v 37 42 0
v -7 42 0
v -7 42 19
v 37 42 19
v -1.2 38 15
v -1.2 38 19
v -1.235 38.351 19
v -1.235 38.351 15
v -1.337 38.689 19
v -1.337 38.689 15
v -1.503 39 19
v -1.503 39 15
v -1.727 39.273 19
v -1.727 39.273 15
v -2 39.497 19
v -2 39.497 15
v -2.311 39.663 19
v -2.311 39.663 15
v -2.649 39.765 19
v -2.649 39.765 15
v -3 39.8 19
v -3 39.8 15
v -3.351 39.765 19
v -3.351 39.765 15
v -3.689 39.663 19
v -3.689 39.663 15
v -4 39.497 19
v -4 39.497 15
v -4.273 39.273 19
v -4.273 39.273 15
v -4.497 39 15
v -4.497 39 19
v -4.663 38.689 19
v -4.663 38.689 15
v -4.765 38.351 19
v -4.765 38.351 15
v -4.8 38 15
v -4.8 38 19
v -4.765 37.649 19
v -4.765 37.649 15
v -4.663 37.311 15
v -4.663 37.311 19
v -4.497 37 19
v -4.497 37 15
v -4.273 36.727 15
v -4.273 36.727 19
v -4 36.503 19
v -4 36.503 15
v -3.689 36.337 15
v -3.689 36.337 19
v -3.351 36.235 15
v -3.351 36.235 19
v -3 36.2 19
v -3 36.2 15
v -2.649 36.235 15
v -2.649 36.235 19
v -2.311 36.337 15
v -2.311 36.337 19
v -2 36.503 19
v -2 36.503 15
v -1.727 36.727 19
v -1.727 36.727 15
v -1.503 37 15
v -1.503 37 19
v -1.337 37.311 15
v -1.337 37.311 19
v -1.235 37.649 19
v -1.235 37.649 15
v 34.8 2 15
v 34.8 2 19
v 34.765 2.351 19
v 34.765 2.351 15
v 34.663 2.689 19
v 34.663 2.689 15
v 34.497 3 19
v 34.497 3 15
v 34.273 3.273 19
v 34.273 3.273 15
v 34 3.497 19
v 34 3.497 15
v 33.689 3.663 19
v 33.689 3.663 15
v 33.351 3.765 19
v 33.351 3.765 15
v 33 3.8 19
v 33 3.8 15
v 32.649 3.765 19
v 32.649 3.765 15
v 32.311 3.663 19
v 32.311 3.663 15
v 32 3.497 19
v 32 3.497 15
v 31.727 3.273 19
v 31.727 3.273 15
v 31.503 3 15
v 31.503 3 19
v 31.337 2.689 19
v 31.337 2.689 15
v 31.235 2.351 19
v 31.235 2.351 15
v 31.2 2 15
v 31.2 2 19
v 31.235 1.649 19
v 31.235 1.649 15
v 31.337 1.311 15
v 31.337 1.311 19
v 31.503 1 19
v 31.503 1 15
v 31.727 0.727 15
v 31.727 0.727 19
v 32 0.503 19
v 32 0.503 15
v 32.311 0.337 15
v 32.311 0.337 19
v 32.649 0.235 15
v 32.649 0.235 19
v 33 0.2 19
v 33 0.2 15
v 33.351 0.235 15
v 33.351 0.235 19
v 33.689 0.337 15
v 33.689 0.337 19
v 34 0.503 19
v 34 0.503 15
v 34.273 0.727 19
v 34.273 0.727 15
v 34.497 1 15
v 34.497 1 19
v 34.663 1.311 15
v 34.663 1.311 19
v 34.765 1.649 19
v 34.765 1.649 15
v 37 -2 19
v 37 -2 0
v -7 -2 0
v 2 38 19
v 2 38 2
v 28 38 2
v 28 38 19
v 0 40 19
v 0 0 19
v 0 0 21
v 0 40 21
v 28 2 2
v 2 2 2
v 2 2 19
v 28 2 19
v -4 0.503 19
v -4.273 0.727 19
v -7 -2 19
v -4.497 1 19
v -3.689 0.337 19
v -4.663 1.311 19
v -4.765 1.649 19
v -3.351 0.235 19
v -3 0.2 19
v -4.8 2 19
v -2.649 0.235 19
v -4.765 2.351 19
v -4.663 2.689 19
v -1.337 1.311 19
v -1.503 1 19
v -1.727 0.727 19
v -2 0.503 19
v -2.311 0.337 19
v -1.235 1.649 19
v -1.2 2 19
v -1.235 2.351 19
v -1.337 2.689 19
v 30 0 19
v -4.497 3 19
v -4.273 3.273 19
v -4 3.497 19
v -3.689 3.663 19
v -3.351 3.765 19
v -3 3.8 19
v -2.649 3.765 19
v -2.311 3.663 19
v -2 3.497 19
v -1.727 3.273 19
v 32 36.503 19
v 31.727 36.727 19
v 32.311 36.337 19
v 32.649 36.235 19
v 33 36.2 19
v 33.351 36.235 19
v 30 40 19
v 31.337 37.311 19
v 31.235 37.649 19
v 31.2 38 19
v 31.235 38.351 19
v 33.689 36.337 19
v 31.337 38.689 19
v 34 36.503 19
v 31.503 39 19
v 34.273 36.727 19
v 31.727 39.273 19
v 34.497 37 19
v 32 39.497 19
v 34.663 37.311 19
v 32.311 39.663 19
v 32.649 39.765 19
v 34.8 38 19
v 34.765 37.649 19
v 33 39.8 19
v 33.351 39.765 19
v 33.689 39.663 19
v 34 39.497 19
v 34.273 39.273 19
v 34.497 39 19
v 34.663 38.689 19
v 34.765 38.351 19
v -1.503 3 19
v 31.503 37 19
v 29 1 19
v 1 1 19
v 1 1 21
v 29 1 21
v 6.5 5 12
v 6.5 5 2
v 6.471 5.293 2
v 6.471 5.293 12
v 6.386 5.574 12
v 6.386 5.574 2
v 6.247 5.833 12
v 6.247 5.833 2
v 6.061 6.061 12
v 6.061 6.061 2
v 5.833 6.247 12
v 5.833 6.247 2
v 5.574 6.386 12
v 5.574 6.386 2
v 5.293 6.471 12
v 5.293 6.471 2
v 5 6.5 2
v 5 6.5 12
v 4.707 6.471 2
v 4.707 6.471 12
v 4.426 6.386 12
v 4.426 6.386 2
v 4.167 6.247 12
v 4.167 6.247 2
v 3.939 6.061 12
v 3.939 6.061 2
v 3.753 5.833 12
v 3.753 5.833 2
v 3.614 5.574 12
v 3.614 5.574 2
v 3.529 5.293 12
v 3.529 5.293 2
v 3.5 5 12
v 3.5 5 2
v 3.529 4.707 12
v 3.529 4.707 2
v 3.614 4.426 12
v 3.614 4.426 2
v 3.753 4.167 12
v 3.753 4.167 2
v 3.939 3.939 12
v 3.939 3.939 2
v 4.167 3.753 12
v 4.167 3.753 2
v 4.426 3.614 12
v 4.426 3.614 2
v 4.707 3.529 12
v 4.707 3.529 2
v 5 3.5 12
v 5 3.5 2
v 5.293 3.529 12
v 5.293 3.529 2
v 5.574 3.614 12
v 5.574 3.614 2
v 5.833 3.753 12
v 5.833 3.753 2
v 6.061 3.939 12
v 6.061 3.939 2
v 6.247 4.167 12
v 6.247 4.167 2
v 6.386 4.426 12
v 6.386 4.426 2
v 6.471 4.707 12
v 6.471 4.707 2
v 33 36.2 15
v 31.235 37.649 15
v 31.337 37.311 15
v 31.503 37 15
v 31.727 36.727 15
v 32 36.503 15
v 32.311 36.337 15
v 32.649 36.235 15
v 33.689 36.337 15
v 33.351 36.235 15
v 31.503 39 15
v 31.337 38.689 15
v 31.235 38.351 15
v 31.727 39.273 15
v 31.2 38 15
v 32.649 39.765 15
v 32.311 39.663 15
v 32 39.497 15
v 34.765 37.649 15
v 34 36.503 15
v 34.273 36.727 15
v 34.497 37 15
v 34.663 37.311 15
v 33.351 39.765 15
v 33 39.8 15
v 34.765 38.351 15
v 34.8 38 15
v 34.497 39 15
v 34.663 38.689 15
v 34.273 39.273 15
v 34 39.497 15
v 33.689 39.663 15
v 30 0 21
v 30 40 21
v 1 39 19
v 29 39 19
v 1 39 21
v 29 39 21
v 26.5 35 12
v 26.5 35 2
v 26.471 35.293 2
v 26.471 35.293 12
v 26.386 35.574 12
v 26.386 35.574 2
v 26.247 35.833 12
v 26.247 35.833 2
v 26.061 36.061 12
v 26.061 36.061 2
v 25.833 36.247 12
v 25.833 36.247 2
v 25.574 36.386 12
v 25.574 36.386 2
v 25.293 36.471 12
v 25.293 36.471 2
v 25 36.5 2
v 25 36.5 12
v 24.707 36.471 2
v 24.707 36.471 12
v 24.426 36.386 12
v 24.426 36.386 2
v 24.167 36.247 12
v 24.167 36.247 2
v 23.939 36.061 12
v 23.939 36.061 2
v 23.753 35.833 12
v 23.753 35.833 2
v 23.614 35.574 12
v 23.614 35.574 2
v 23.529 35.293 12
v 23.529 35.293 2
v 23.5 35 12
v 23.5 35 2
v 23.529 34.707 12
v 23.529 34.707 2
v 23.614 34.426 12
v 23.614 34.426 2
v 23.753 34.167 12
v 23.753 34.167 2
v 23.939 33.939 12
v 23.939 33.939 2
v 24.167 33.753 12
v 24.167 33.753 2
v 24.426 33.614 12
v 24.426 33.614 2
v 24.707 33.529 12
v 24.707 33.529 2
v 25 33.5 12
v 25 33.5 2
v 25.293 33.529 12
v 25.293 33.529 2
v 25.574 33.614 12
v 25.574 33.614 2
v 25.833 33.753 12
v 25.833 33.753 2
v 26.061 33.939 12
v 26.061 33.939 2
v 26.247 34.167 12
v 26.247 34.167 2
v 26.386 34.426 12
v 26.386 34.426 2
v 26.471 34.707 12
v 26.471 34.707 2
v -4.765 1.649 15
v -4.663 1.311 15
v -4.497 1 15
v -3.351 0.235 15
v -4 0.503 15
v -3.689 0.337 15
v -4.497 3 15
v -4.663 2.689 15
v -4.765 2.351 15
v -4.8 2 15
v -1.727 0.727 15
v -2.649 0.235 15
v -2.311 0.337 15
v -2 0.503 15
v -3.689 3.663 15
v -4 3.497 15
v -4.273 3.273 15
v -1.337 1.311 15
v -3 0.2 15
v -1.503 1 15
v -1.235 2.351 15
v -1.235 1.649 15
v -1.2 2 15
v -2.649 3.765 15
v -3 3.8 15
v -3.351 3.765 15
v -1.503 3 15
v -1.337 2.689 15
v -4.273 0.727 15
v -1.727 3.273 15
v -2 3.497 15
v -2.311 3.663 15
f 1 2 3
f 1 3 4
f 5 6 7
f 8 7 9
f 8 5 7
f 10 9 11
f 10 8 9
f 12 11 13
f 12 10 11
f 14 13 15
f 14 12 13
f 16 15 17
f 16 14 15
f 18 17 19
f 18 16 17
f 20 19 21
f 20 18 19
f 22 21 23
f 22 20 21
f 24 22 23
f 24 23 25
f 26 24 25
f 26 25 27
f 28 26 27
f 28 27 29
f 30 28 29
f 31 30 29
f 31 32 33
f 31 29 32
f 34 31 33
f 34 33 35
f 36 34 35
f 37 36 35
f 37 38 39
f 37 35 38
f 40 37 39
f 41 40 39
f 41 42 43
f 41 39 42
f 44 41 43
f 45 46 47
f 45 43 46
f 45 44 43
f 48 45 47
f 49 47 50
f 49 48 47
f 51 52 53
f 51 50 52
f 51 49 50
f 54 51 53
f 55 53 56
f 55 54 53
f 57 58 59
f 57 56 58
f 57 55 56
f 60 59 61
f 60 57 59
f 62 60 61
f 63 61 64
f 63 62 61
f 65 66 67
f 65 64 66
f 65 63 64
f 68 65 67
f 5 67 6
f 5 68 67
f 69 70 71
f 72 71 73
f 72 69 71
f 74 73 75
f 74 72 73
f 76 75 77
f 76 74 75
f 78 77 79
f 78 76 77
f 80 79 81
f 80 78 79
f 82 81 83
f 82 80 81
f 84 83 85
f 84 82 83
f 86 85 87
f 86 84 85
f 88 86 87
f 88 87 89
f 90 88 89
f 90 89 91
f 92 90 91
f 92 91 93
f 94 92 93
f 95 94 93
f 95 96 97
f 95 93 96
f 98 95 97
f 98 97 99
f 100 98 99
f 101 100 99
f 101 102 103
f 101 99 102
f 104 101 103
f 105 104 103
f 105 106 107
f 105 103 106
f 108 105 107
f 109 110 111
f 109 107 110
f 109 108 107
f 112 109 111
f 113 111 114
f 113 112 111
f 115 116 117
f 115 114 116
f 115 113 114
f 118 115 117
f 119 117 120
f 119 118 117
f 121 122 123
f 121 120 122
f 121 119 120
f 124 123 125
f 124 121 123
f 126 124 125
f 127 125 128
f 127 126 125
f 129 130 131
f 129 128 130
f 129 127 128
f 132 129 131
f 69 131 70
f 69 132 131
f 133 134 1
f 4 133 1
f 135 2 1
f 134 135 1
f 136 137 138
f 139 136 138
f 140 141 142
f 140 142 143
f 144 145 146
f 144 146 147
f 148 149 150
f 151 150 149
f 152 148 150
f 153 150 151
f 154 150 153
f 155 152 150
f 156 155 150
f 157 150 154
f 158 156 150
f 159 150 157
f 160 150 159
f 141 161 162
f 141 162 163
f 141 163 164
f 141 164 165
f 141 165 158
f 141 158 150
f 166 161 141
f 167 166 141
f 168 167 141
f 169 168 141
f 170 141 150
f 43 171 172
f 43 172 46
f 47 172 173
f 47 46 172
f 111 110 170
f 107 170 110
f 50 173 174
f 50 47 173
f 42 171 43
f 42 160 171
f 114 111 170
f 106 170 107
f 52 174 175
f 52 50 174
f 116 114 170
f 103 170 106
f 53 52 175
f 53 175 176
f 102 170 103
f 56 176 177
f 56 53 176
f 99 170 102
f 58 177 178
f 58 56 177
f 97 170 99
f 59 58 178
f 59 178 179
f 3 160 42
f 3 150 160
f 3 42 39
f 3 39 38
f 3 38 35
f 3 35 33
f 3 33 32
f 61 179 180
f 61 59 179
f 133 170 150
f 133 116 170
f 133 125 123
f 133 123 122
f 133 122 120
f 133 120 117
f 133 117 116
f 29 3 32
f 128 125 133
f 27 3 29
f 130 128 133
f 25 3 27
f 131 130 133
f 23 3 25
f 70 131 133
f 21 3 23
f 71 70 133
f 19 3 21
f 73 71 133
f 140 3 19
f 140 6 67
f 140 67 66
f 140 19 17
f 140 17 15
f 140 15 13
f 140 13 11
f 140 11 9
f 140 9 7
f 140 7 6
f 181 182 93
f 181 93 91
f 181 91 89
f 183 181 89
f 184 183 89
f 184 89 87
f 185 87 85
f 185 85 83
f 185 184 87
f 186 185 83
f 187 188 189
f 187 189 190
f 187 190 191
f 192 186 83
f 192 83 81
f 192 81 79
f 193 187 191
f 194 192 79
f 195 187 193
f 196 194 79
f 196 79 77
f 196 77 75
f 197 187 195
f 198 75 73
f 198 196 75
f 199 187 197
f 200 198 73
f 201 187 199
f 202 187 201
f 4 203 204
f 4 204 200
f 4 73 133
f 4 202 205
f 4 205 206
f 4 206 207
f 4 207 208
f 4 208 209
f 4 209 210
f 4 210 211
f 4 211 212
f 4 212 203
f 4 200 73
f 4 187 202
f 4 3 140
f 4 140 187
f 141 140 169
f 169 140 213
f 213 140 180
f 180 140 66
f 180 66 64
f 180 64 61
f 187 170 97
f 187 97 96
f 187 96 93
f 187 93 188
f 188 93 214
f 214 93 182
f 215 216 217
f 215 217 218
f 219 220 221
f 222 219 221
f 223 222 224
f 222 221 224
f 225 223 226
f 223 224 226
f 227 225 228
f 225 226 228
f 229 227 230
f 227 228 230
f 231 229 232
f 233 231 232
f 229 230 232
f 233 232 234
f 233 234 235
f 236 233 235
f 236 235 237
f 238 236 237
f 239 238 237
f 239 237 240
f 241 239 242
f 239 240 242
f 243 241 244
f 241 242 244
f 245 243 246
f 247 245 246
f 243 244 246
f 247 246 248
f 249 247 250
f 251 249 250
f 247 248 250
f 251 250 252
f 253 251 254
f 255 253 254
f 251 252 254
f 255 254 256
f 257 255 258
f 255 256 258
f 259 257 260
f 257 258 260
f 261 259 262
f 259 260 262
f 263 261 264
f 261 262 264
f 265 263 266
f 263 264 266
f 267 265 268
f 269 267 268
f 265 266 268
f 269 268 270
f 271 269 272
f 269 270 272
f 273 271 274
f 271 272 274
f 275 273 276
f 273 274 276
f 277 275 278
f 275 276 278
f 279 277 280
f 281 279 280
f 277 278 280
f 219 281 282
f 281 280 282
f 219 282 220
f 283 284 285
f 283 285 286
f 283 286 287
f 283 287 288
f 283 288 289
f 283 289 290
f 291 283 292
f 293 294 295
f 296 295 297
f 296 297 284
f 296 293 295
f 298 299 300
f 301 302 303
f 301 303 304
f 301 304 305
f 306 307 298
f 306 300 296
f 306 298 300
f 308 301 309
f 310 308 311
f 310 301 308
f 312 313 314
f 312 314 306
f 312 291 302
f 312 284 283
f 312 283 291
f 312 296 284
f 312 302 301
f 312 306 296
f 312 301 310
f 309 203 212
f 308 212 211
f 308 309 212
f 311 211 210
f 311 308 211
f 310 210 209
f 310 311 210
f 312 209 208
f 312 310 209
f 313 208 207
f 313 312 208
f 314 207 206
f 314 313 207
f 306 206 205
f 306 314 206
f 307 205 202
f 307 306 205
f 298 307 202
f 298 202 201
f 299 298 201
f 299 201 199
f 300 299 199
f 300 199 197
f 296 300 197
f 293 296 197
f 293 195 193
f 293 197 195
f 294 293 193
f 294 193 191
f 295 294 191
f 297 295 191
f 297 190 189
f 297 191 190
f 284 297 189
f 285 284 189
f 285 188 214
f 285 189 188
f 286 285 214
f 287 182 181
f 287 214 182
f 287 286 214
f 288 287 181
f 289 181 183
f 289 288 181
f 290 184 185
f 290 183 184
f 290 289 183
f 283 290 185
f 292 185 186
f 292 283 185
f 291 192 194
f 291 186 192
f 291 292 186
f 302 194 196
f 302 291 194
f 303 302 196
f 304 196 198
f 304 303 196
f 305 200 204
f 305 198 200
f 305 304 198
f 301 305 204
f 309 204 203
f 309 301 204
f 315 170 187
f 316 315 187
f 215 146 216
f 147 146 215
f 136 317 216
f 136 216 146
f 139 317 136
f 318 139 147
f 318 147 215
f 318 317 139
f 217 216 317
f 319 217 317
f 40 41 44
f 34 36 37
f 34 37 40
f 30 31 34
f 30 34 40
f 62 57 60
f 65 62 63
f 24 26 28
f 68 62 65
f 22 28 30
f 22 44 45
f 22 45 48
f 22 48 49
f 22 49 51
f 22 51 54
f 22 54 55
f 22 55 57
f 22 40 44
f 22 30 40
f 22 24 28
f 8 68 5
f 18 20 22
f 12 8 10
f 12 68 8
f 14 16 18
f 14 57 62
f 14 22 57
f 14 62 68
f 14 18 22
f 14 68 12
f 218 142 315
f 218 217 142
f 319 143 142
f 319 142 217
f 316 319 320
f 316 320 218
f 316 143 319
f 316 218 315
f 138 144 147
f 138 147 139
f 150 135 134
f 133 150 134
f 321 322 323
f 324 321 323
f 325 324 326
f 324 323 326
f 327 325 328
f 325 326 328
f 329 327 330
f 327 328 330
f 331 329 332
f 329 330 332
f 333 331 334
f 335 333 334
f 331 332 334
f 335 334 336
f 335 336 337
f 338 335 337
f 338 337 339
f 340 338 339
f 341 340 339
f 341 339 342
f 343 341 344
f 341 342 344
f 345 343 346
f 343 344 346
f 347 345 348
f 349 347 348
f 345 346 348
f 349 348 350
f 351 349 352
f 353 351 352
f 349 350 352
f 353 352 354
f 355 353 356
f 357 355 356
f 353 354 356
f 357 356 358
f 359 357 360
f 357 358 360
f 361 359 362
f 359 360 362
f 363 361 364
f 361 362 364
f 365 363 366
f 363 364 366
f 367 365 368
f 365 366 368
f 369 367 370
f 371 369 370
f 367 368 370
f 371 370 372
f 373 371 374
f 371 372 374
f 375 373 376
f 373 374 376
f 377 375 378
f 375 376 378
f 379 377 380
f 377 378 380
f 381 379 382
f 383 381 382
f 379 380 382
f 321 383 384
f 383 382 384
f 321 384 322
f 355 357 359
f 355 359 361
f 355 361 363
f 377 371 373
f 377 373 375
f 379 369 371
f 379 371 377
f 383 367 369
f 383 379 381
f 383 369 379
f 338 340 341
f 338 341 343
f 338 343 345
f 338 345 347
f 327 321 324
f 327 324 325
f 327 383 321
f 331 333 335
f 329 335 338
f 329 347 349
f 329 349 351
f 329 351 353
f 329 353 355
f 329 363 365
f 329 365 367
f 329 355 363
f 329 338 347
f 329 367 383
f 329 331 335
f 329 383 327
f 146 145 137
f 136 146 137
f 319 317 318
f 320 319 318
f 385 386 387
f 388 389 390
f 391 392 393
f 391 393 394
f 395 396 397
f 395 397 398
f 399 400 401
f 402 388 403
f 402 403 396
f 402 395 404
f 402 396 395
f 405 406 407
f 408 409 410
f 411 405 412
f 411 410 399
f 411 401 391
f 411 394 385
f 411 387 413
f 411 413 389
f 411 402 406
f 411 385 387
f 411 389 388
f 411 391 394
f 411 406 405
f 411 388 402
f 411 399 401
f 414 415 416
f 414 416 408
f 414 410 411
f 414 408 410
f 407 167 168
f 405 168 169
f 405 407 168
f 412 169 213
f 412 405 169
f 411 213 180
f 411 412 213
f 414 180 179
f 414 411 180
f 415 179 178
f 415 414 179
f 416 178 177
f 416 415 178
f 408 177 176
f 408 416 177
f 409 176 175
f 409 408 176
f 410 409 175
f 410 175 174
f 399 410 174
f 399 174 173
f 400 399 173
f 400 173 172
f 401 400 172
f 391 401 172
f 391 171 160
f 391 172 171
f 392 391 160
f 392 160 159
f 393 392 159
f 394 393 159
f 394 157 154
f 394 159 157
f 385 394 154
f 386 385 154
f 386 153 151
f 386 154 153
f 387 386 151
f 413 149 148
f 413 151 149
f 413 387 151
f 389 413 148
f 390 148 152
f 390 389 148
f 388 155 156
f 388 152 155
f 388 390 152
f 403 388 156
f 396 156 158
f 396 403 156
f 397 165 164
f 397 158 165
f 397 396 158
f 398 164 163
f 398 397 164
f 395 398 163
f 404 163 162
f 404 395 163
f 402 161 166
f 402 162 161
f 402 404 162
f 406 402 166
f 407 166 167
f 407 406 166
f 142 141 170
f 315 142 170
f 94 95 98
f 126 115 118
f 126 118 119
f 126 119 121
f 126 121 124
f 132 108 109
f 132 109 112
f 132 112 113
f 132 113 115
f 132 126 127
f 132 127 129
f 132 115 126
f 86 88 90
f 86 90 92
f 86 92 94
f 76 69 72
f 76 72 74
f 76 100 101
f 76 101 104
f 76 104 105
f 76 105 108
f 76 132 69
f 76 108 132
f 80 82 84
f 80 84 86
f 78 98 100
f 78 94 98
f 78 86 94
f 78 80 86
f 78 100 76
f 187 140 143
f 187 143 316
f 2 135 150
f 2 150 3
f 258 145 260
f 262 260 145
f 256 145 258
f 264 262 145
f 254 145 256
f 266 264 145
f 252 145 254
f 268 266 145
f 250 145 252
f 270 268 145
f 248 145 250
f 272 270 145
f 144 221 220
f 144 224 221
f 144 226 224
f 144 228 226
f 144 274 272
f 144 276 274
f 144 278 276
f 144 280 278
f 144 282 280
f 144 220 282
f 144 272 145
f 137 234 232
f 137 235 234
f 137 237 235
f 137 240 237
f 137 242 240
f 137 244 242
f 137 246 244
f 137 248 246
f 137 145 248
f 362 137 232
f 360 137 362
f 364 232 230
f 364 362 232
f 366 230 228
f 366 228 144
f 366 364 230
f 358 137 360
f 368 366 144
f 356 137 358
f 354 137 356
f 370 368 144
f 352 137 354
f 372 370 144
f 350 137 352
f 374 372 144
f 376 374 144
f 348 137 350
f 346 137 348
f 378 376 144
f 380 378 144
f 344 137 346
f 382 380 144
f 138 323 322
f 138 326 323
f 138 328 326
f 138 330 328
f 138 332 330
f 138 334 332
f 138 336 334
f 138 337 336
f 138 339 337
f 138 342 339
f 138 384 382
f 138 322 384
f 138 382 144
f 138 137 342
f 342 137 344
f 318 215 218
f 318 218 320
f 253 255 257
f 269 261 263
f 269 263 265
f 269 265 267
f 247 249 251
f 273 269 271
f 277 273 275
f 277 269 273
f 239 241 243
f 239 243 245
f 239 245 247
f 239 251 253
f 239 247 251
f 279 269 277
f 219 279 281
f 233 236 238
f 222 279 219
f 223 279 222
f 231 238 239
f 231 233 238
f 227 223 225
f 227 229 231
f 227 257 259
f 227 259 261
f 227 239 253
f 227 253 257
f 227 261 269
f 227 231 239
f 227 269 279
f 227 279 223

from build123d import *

# Parameters (mm, degrees)
CYLINDER002_R     = 1.5
CYLINDER002_DEPTH = 10
CYLINDER001_R     = 1.5
CYLINDER001_DEPTH = 10
SKETCH_W          = 30
SKETCH_H          = 40
SKETCH_W_2        = 28
SKETCH_H_2        = 38
PAD_DEPTH         = 2
CYLINDER006_R     = 1.8
CYLINDER006_DEPTH = 6
CYLINDER007_R     = 1.8
CYLINDER007_DEPTH = 6
CYLINDER008_R     = 1.8
CYLINDER008_DEPTH = 6
CYLINDER005_R     = 1.8
CYLINDER005_DEPTH = 6
BOX001_W          = 26
BOX001_H          = 36
BOX001_DEPTH      = 17
BOX_W             = 44
BOX_H             = 44
BOX_DEPTH         = 19


with BuildPart() as mth002:
    # Cylinder002 → Cylinder002 (new body)
    with BuildSketch(Plane(origin=(25, 35, 2), x_dir=(1, 0, 0), z_dir=(0, 0, 1))):
        Circle(CYLINDER002_R)
    extrude(amount=CYLINDER002_DEPTH)


with BuildPart() as mth001:
    # Cylinder001 → Cylinder001 (new body)
    with BuildSketch(Plane(origin=(5, 5, 2), x_dir=(1, 0, 0), z_dir=(0, 0, 1))):
        Circle(CYLINDER001_R)
    extrude(amount=CYLINDER001_DEPTH)


with BuildPart() as fusion022:
    # Sketch → Pad (new body)
    with BuildSketch(Plane(origin=(2, 2, 19), x_dir=(1, 0, 0), z_dir=(0, 0, 1))):
        with Locations((13, 18)):
            Rectangle(SKETCH_W, SKETCH_H)
        with Locations((13, 18)):
            Rectangle(SKETCH_W_2, SKETCH_H_2, mode=Mode.SUBTRACT)
    extrude(amount=PAD_DEPTH)

    # Fusion022: union MtH002, MtH001
    add(mth002.part)
    add(mth001.part)


with BuildPart() as mh_cut002:
    # Cylinder006 → Cylinder006 (new body)
    with BuildSketch(Plane(origin=(-3, 38, 15), x_dir=(1, 0, 0), z_dir=(0, 0, 1))):
        Circle(CYLINDER006_R)
    extrude(amount=CYLINDER006_DEPTH)


with BuildPart() as mh_cut003:
    # Cylinder007 → Cylinder007 (new body)
    with BuildSketch(Plane(origin=(33, 2, 15), x_dir=(1, 0, 0), z_dir=(0, 0, 1))):
        Circle(CYLINDER007_R)
    extrude(amount=CYLINDER007_DEPTH)


with BuildPart() as mh_cut004:
    # Cylinder008 → Cylinder008 (new body)
    with BuildSketch(Plane(origin=(33, 38, 15), x_dir=(1, 0, 0), z_dir=(0, 0, 1))):
        Circle(CYLINDER008_R)
    extrude(amount=CYLINDER008_DEPTH)


with BuildPart() as screw_cut001:
    # Cylinder005 → Cylinder005 (new body)
    with BuildSketch(Plane(origin=(-3, 2, 15), x_dir=(1, 0, 0), z_dir=(0, 0, 1))):
        Circle(CYLINDER005_R)
    extrude(amount=CYLINDER005_DEPTH)

    # Fusion017: union MH_Cut002, MH_Cut003, MH_Cut004
    add(mh_cut002.part)
    add(mh_cut003.part)
    add(mh_cut004.part)


with BuildPart() as box_in:
    # Box001 → Box001 (new body)
    with BuildSketch(Plane(origin=(2, 2, 2), x_dir=(1, 0, 0), z_dir=(0, 0, 1))):
        with Locations((13, 18)):
            Rectangle(BOX001_W, BOX001_H)
    extrude(amount=BOX001_DEPTH)


with BuildPart() as base_final:
    # Box → Box (new body)
    with BuildSketch(Plane(origin=(-7, -2, 0), x_dir=(1, 0, 0), z_dir=(0, 0, 1))):
        with Locations((22, 22)):
            Rectangle(BOX_W, BOX_H)
    extrude(amount=BOX_DEPTH)

    # Cut: cut Box_in
    add(box_in.part, mode=Mode.SUBTRACT)

    # Cut007: cut Screw_cut001
    add(screw_cut001.part, mode=Mode.SUBTRACT)

    # Fusion023: union Fusion022
    add(fusion022.part)


solid = base_final.part
